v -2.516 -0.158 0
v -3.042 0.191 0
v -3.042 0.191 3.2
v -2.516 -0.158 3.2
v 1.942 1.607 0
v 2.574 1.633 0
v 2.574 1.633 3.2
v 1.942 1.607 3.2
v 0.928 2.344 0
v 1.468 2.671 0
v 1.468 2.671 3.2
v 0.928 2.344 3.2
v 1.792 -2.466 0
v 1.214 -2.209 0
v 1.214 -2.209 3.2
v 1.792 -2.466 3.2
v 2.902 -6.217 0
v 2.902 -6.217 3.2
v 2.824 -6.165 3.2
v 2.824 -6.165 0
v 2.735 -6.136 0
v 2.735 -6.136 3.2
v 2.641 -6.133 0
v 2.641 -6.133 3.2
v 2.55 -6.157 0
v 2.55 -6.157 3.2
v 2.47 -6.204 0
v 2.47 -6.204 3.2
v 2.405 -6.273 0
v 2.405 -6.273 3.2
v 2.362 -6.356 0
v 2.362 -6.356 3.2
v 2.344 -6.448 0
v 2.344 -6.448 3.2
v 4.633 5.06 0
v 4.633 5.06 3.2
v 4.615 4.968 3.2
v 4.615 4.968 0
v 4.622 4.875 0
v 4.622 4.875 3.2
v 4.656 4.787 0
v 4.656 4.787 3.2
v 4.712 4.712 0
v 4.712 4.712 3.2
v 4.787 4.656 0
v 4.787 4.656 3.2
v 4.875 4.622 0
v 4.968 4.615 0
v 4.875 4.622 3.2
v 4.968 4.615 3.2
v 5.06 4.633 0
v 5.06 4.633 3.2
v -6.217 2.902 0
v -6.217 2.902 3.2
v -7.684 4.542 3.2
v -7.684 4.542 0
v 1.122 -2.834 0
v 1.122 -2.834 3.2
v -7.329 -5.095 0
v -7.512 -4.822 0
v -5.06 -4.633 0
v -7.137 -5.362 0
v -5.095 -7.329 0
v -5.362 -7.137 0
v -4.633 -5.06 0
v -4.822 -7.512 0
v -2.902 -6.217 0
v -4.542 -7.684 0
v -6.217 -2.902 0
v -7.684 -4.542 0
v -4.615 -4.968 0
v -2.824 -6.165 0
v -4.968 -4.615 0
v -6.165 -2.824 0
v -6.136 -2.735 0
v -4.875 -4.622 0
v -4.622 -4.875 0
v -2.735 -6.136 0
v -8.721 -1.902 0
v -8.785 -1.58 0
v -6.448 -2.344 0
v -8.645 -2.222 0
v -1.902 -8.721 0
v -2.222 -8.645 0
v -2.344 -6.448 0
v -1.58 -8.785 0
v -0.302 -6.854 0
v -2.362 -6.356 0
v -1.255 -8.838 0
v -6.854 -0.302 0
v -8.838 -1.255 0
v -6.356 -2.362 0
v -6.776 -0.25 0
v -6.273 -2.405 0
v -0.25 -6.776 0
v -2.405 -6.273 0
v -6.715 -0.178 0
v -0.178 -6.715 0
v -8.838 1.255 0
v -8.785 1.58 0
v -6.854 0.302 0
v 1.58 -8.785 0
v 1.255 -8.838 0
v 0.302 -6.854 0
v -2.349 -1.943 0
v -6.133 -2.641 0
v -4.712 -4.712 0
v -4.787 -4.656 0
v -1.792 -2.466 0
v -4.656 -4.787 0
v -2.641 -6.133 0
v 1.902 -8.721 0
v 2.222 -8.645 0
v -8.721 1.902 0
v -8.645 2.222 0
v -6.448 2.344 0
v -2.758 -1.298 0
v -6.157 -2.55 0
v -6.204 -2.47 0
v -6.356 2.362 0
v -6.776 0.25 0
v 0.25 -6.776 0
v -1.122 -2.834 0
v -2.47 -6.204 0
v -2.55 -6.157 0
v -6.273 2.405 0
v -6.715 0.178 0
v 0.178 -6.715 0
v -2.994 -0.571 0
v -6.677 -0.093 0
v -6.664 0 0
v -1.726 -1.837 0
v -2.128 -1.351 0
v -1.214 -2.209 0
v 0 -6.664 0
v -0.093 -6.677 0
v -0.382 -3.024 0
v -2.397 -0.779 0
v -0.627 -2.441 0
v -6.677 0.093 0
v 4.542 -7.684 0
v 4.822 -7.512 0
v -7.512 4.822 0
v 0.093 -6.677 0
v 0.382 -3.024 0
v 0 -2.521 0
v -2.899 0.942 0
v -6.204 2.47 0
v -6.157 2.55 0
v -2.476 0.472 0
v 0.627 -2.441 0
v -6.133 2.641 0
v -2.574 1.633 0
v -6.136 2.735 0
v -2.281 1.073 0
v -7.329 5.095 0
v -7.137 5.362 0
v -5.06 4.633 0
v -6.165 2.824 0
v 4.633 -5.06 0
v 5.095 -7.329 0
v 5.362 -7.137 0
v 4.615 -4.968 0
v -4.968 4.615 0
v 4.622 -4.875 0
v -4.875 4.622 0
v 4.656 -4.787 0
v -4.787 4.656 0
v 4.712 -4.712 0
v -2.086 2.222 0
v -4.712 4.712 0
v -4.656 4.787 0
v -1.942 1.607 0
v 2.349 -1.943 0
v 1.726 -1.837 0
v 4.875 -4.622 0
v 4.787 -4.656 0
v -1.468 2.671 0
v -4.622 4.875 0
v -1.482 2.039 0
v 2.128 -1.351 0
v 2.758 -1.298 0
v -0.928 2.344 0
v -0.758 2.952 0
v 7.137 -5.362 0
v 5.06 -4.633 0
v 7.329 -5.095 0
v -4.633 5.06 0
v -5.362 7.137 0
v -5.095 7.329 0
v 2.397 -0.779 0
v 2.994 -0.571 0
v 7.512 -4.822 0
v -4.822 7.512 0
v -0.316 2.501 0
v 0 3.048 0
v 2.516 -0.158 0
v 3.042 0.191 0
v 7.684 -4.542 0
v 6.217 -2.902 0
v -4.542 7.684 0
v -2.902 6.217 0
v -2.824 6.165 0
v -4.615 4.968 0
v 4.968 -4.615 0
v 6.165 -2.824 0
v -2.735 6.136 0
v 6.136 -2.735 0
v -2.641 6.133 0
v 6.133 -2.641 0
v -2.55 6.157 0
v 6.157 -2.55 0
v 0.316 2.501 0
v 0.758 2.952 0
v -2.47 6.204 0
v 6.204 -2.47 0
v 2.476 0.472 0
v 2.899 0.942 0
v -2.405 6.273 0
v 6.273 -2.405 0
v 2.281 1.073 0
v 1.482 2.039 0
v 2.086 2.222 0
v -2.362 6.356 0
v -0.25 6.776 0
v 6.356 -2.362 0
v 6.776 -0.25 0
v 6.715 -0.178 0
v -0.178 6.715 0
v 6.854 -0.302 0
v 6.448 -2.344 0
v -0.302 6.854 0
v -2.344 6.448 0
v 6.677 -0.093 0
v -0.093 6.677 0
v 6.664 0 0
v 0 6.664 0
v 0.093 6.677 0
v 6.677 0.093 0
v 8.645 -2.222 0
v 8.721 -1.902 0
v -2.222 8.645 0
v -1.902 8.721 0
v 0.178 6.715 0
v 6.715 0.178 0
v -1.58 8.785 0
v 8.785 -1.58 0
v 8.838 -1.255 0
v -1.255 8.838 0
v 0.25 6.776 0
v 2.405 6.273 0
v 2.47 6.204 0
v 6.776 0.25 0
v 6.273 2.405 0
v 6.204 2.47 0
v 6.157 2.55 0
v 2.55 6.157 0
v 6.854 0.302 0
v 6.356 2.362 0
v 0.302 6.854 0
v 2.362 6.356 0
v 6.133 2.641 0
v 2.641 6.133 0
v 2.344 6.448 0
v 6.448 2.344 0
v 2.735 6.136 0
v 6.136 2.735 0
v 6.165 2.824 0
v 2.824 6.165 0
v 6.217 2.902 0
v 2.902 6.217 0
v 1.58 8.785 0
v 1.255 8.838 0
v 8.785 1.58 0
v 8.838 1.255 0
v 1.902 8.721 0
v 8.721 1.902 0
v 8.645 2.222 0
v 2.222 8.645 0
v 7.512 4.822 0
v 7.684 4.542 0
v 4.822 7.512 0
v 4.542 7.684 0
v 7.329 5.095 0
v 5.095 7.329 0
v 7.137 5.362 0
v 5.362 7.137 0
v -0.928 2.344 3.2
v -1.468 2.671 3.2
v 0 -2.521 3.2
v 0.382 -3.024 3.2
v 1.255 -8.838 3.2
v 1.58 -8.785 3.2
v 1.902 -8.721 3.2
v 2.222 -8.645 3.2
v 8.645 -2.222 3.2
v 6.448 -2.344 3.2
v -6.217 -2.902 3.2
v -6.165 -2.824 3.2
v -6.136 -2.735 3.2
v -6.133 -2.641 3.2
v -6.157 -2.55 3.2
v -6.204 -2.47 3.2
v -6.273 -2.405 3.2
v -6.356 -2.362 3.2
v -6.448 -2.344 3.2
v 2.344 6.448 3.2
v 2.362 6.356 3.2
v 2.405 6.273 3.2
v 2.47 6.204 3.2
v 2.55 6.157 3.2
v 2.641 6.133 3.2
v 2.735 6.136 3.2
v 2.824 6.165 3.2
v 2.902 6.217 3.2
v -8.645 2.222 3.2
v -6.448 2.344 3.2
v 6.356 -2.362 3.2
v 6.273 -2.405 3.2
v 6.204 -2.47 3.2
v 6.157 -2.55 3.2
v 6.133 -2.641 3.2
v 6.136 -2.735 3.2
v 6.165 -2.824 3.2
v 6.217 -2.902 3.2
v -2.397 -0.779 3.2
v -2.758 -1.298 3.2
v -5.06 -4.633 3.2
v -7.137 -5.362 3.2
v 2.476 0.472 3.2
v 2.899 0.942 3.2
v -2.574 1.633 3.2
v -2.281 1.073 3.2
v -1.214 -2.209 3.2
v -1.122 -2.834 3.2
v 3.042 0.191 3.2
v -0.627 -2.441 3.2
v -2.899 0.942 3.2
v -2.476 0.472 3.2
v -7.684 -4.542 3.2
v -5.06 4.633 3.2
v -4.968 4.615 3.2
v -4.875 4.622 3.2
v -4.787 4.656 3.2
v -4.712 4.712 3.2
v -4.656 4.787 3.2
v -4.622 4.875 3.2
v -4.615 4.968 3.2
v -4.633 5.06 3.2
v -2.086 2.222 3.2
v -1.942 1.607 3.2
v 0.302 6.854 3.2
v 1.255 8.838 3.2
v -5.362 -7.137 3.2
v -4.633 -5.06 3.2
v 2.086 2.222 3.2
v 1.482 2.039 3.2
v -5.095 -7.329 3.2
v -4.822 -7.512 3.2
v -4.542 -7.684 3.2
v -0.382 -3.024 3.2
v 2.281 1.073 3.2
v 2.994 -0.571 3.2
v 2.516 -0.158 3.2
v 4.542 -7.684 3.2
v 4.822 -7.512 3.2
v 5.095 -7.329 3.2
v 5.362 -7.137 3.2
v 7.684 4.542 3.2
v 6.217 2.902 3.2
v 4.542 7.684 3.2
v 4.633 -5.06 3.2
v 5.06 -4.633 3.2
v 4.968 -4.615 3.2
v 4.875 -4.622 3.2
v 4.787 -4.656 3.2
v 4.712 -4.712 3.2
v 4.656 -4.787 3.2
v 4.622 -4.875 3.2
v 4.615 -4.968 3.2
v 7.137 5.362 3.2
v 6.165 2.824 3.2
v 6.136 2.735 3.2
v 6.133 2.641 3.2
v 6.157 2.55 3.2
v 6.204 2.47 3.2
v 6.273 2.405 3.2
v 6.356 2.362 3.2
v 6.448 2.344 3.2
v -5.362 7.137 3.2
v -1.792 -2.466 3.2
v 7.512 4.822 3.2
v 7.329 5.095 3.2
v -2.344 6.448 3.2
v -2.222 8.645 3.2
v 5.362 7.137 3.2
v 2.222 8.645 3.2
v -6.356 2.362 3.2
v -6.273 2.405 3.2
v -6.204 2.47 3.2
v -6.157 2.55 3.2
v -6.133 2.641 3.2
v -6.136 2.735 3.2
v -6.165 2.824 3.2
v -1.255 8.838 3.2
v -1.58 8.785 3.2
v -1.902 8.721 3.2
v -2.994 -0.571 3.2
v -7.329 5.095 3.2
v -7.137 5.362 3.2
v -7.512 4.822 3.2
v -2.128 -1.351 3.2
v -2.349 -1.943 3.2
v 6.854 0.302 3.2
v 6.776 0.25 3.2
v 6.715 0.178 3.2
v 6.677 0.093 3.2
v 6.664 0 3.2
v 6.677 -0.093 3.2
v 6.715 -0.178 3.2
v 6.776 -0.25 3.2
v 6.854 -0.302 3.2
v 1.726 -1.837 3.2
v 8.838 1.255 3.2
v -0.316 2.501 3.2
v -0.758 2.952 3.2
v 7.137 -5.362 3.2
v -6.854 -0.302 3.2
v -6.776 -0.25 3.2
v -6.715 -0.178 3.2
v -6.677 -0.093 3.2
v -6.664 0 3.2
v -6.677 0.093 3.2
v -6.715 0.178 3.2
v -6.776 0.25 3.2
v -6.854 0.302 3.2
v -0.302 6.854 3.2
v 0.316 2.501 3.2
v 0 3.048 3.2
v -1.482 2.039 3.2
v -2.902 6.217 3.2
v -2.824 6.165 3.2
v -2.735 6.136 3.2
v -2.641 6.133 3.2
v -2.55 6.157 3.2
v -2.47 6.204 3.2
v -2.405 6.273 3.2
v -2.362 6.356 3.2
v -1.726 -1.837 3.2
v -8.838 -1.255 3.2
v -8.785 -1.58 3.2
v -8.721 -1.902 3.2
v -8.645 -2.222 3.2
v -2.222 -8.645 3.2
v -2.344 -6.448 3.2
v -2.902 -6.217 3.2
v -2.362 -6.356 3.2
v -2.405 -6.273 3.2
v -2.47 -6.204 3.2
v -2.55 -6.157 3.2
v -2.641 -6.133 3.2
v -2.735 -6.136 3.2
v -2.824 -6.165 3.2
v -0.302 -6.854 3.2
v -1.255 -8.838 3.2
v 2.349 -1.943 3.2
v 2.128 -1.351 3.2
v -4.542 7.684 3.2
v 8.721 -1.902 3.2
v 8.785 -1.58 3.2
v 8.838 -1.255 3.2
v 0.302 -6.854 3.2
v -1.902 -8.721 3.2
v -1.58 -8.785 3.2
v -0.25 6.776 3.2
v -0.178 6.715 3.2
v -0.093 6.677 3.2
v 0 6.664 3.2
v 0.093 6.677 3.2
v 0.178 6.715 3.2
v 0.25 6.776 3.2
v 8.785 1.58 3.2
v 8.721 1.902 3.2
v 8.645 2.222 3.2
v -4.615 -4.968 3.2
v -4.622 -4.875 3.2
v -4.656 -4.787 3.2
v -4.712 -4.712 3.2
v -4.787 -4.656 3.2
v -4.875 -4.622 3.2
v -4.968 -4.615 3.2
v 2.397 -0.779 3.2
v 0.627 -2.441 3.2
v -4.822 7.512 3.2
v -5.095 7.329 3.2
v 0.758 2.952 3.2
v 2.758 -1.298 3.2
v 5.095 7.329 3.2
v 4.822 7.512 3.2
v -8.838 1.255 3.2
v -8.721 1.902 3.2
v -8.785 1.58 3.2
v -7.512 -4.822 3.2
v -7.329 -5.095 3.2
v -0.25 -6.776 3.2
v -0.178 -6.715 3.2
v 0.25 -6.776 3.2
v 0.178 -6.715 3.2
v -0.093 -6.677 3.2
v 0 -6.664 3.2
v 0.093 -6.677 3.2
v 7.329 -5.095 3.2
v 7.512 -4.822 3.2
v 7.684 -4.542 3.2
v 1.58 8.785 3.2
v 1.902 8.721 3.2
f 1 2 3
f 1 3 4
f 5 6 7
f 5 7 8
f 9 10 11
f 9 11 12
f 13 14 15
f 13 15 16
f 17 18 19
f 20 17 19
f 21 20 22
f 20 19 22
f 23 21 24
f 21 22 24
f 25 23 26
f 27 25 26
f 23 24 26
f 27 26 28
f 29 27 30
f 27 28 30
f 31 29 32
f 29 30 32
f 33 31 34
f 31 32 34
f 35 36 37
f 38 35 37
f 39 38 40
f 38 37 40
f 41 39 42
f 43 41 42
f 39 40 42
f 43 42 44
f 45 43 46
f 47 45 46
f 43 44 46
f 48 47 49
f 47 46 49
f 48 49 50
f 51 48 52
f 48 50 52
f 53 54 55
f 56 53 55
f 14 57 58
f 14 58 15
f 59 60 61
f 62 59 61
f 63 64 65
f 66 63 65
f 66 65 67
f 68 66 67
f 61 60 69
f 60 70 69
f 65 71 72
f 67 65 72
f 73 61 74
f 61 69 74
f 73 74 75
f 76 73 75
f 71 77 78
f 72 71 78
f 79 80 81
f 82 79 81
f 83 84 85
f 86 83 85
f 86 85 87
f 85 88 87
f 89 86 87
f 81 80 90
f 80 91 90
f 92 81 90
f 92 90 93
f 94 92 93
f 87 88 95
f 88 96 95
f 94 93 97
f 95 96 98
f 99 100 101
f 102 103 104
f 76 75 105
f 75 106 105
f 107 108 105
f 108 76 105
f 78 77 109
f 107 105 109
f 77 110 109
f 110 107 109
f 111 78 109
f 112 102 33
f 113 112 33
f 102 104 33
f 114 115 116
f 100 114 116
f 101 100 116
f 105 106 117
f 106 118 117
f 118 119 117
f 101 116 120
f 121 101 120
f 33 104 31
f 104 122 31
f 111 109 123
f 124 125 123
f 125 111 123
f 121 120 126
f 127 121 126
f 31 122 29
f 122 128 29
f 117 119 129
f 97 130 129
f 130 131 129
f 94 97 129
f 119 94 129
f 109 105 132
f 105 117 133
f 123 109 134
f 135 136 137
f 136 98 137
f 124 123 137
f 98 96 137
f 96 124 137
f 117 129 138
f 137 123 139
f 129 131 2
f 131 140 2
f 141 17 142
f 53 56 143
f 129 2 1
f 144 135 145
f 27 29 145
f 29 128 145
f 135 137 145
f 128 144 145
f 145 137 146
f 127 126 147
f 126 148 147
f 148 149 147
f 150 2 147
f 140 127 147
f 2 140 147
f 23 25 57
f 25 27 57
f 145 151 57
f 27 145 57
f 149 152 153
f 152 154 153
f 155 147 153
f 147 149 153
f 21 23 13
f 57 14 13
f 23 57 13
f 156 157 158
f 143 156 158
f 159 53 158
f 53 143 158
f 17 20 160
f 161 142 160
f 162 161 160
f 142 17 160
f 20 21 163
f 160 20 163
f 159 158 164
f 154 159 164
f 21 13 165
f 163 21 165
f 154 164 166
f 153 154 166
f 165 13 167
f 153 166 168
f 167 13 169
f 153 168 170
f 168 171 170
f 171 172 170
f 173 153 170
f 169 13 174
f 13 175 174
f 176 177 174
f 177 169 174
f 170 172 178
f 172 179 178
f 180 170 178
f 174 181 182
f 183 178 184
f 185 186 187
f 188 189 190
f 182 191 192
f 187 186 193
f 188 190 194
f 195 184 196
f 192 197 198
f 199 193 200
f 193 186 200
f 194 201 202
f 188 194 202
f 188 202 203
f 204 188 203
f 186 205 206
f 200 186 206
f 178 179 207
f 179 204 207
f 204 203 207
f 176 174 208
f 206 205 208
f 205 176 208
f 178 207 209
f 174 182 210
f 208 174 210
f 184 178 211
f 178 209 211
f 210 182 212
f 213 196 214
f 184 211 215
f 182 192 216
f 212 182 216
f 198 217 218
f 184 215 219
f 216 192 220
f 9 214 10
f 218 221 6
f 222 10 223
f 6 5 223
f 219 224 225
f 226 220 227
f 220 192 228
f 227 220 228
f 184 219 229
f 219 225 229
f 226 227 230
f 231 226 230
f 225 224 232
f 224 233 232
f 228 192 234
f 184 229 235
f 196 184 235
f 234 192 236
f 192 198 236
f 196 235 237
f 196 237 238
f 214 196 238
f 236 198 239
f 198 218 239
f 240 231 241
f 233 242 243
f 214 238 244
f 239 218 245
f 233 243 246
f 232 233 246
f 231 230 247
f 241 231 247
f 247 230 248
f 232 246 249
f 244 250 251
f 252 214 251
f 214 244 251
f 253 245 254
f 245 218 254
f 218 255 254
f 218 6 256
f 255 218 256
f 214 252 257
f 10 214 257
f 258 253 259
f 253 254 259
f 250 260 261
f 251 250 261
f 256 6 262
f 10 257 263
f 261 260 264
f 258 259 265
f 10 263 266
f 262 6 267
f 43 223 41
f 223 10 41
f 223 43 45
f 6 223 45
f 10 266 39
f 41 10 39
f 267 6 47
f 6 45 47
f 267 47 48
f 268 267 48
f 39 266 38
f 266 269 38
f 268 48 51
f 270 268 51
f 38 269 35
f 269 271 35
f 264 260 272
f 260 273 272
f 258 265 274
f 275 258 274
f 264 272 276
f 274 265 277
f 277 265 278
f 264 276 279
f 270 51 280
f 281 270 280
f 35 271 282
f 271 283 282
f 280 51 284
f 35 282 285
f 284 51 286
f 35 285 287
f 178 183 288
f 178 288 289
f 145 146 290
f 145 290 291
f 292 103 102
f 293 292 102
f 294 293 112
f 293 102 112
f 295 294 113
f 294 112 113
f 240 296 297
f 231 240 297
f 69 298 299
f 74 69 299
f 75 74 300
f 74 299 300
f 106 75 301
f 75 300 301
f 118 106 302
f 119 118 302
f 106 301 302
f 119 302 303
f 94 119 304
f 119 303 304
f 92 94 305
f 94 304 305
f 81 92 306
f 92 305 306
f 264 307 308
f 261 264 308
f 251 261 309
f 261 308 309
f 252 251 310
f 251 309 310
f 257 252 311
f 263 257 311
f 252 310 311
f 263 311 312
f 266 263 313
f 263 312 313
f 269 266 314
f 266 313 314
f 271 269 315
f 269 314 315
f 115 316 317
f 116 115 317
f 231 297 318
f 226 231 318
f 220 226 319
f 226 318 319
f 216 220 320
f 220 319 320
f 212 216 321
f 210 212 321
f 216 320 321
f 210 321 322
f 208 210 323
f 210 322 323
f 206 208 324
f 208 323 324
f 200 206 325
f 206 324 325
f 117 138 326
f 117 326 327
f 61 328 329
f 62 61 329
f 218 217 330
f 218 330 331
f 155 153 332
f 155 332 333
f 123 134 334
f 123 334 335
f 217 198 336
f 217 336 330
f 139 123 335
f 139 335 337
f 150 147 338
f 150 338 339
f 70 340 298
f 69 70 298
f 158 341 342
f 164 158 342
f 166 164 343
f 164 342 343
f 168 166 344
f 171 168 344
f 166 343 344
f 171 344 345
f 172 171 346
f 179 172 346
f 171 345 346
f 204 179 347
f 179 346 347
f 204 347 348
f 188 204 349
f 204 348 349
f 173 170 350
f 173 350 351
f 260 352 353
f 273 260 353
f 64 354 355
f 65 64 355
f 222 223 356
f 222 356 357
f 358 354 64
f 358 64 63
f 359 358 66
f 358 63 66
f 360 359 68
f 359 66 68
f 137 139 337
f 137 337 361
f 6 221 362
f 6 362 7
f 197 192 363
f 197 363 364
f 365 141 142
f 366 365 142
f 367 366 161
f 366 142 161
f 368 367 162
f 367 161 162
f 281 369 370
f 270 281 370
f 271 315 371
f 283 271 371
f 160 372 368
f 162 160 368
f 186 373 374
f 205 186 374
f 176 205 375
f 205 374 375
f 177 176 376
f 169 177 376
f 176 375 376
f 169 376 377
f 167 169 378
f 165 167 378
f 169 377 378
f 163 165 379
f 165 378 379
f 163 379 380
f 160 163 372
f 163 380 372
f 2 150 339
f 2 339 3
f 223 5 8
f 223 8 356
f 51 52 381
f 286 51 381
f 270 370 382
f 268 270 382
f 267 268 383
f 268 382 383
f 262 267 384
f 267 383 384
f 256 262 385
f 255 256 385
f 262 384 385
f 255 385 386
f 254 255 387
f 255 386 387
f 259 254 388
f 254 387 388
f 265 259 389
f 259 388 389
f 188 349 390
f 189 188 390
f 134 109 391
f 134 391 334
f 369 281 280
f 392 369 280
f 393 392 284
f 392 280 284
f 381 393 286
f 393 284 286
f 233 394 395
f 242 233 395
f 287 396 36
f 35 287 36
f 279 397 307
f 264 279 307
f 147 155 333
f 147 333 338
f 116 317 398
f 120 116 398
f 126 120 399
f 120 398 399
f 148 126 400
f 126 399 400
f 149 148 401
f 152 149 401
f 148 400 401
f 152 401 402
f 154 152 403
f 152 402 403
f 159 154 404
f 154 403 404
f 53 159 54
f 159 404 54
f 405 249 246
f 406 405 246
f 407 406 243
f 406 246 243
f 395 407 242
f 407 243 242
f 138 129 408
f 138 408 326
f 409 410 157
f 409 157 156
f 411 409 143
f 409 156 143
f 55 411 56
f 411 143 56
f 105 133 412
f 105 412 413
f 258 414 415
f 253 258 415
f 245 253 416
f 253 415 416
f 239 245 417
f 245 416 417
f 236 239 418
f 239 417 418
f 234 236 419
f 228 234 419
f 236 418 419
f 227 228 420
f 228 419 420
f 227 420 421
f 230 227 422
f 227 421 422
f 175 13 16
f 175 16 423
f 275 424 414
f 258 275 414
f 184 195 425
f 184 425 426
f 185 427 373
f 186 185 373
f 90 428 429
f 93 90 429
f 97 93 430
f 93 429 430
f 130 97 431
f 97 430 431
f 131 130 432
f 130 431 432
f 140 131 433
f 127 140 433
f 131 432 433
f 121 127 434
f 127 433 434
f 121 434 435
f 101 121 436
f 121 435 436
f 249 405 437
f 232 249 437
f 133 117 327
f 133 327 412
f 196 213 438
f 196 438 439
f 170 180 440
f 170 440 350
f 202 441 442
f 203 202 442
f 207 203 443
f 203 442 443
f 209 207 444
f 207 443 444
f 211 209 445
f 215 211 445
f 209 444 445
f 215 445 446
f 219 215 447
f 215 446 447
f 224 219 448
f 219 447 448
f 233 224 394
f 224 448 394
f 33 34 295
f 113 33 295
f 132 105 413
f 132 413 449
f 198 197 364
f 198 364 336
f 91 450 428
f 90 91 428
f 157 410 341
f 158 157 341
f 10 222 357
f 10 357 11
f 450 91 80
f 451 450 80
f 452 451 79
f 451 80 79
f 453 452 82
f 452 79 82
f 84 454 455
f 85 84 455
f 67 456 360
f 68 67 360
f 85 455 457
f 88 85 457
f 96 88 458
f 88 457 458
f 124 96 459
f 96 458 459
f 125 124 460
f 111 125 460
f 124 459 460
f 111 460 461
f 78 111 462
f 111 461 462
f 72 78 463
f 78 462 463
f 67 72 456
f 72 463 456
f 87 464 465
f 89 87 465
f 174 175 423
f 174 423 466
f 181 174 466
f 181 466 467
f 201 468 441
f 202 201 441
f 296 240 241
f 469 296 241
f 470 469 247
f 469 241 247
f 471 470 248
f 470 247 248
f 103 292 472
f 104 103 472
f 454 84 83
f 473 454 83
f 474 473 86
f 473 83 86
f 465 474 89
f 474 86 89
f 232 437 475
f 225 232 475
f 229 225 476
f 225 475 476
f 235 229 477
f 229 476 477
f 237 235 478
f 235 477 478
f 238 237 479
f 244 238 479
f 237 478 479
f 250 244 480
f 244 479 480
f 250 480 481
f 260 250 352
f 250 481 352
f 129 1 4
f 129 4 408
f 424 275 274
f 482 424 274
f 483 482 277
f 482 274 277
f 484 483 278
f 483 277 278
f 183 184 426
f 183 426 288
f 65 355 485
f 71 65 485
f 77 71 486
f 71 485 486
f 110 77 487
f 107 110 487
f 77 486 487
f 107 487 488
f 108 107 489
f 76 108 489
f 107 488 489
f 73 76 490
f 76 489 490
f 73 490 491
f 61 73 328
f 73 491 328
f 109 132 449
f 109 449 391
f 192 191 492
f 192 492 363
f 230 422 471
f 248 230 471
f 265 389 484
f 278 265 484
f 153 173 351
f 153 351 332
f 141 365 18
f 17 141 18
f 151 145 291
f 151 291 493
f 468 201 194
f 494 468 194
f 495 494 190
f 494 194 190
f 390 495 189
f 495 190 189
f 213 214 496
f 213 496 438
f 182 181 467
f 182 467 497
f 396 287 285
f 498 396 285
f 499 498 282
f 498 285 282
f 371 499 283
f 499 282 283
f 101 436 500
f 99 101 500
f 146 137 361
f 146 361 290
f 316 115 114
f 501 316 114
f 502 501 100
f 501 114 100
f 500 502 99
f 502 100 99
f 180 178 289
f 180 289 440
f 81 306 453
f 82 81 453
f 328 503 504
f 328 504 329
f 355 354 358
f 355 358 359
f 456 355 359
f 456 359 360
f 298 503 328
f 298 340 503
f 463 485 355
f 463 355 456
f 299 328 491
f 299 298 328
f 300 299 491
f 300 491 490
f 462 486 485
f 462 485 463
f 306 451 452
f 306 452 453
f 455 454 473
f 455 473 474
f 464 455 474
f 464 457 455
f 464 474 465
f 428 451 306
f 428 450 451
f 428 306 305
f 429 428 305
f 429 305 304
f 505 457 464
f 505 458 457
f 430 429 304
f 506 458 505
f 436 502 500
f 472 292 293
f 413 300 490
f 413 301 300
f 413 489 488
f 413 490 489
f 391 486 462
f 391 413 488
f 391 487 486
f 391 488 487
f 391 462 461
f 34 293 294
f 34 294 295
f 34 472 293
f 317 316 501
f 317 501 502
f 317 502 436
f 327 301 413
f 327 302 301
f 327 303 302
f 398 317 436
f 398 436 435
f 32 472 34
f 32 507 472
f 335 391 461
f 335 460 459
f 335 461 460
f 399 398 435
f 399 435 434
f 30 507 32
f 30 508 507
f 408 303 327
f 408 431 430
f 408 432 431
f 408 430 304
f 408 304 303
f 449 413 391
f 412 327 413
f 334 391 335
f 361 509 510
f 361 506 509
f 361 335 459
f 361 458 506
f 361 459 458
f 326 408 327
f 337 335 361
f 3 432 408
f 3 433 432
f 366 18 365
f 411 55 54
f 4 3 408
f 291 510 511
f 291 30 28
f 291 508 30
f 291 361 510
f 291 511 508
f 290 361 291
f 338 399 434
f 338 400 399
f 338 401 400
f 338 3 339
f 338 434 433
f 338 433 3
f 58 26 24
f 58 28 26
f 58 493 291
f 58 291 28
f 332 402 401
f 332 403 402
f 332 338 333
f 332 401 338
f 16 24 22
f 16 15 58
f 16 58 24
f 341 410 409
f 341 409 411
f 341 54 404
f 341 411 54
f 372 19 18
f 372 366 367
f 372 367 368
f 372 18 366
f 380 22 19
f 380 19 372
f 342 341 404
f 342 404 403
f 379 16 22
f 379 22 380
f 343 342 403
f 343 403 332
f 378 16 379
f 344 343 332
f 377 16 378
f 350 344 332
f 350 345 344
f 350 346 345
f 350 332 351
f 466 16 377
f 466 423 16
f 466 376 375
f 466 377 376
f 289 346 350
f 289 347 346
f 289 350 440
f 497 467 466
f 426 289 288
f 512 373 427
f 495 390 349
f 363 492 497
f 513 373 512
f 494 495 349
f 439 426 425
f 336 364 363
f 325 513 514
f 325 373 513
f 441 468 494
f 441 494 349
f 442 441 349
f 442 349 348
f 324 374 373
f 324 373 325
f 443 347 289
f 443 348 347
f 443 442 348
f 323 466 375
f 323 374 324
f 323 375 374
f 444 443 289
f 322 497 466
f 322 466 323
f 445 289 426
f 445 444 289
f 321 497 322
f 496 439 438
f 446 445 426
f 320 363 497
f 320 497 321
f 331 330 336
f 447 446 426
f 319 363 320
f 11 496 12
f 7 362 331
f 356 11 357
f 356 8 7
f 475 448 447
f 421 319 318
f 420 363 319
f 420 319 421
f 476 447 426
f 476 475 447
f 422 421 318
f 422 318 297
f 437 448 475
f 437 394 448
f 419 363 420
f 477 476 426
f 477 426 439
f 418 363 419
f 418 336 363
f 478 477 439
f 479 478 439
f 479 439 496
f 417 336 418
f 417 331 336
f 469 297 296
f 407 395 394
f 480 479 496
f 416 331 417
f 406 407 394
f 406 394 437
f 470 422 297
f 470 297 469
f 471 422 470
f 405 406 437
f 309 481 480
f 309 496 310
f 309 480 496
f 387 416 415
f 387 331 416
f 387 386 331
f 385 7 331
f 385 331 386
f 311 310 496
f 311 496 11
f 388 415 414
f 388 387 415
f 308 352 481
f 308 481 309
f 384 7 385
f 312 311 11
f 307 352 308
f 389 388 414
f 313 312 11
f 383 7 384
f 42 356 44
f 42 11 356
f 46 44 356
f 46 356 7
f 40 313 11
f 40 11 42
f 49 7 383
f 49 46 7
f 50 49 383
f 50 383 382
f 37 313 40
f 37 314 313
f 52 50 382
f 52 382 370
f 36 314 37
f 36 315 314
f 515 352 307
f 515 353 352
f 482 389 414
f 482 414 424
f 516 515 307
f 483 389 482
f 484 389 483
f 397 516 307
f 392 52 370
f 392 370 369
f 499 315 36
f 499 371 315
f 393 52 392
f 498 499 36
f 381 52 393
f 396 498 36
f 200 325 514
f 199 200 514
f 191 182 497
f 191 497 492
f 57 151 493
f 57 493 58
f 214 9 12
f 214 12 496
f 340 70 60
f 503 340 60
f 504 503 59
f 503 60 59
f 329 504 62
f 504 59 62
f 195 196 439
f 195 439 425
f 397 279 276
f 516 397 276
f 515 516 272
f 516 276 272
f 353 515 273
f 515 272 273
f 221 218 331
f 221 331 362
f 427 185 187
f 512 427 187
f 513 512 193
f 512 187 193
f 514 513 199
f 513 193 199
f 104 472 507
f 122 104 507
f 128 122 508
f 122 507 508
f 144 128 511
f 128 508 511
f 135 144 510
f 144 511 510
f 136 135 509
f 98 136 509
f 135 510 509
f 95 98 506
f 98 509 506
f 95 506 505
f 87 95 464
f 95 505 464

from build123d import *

# Parameters (mm, degrees)
SKETCH1_R           = 8.926200703
BOSS_EXTRUDE1_DEPTH = 3.2004
CUT_EXTRUDE1_DEPTH  = 3.2004


with BuildPart() as part:
    # Sketch1 → Boss-Extrude1 (new body)
    with BuildSketch(Plane.XY):
        Circle(SKETCH1_R)
        Polygon((0, 3.048), (-0.315924789, 2.500802214), (-0.758006776, 2.952241475), (-0.927923651, 2.343667613), (-1.468385199, 2.670982761), (-1.481617658, 2.039271757), (-2.086499579, 2.221896376), (-1.942216178, 1.606740957), (-2.573511517, 1.633200071), (-2.280778112, 1.073252713), (-2.898820262, 0.941883799), (-2.47603037, 0.472328054), (-3.041985468, 0.191385504), (-2.515704533, -0.158274714), (-2.99401154, -0.571138247), (-2.397307729, -0.778932499), (-2.757912856, -1.297775281), (-2.128279263, -1.350647091), (-2.348524364, -1.942868321), (-1.725523184, -1.837495558), (-1.791569449, -2.465883799), (-1.214346137, -2.208887422), (-1.122043637, -2.833958729), (-0.626867256, -2.441486766), (-0.382015696, -3.02396561), (0, -2.520678517), (0.382015696, -3.02396561), (0.626867256, -2.441486766), (1.122043637, -2.833958729), (1.214346137, -2.208887422), (1.791569449, -2.465883799), (1.725523184, -1.837495558), (2.348524364, -1.942868321), (2.128279263, -1.350647091), (2.757912856, -1.297775281), (2.397307729, -0.778932499), (2.99401154, -0.571138247), (2.515704533, -0.158274714), (3.041985468, 0.191385504), (2.47603037, 0.472328054), (2.898820262, 0.941883799), (2.280778112, 1.073252713), (2.573511517, 1.633200071), (1.942216178, 1.606740957), (2.086499579, 2.221896376), (1.481617658, 2.039271757), (1.468385199, 2.670982761), (0.927923651, 2.343667613), (0.758006776, 2.952241475), (0.315924789, 2.500802214), align=None, mode=Mode.SUBTRACT)
    extrude(amount=BOSS_EXTRUDE1_DEPTH)

    # Sketch2 → Cut-Extrude1 (cut)
    with BuildSketch(Plane.XY.offset(3.2004)):
        with BuildLine():
            Line((-1.255122678, 8.837518093), (-0.301897322, 6.853917937))
            ThreePointArc((-0.301897322, 6.853917937), (0, 6.664048588), (0.301897322, 6.853917937))
            Line((0.301897322, 6.853917937), (1.255122678, 8.837518093))
            ThreePointArc((1.255122678, 8.837518093), (0, 8.926200703), (-1.255122678, 8.837518093))
        make_face()
        with BuildLine():
            Line((2.901797598, 6.216663396), (4.54155391, 7.68448743))
            ThreePointArc((4.54155391, 7.68448743), (3.415909123, 8.246734132), (2.222389605, 8.645116739))
            Line((2.222389605, 8.645116739), (2.343964085, 6.447725603))
            ThreePointArc((2.343964085, 6.447725603), (2.550220987, 6.156778094), (2.901797598, 6.216663396))
        make_face()
        with BuildLine():
            Line((5.059925495, 4.632978207), (7.136574729, 5.361563216))
            ThreePointArc((7.136574729, 5.361563216), (6.311777047, 6.311777047), (5.361563216, 7.136574729))
            Line((5.361563216, 7.136574729), (4.632978207, 5.059925495))
            ThreePointArc((4.632978207, 5.059925495), (4.712193947, 4.712193947), (5.059925495, 4.632978207))
        make_face()
        with BuildLine():
            Line((6.447725603, 2.343964085), (8.645116739, 2.222389605))
            ThreePointArc((8.645116739, 2.222389605), (8.246734132, 3.415909123), (7.68448743, 4.54155391))
            Line((7.68448743, 4.54155391), (6.216663396, 2.901797598))
            ThreePointArc((6.216663396, 2.901797598), (6.156778094, 2.550220987), (6.447725603, 2.343964085))
        make_face()
        with BuildLine():
            Line((6.853917937, -0.301897322), (8.837518093, -1.255122678))
            ThreePointArc((8.837518093, -1.255122678), (8.926200703, 0), (8.837518093, 1.255122678))
            Line((8.837518093, 1.255122678), (6.853917937, 0.301897322))
            ThreePointArc((6.853917937, 0.301897322), (6.664048588, 0), (6.853917937, -0.301897322))
        make_face()
        with BuildLine():
            Line((6.216663396, -2.901797598), (7.68448743, -4.54155391))
            ThreePointArc((7.68448743, -4.54155391), (8.246734132, -3.415909123), (8.645116739, -2.222389605))
            Line((8.645116739, -2.222389605), (6.447725603, -2.343964085))
            ThreePointArc((6.447725603, -2.343964085), (6.156778094, -2.550220987), (6.216663396, -2.901797598))
        make_face()
        with BuildLine():
            Line((4.632978207, -5.059925495), (5.361563216, -7.136574729))
            ThreePointArc((5.361563216, -7.136574729), (6.311777047, -6.311777047), (7.136574729, -5.361563216))
            Line((7.136574729, -5.361563216), (5.059925495, -4.632978207))
            ThreePointArc((5.059925495, -4.632978207), (4.712193947, -4.712193947), (4.632978207, -5.059925495))
        make_face()
        with BuildLine():
            Line((2.343964085, -6.447725603), (2.222389605, -8.645116739))
            ThreePointArc((2.222389605, -8.645116739), (3.415909123, -8.246734132), (4.54155391, -7.68448743))
            Line((4.54155391, -7.68448743), (2.901797598, -6.216663396))
            ThreePointArc((2.901797598, -6.216663396), (2.550220987, -6.156778094), (2.343964085, -6.447725603))
        make_face()
        with BuildLine():
            Line((-0.301897322, -6.853917937), (-1.255122678, -8.837518093))
            ThreePointArc((-1.255122678, -8.837518093), (0, -8.926200703), (1.255122678, -8.837518093))
            Line((1.255122678, -8.837518093), (0.301897322, -6.853917937))
            ThreePointArc((0.301897322, -6.853917937), (0, -6.664048588), (-0.301897322, -6.853917937))
        make_face()
        with BuildLine():
            Line((-2.901797598, -6.216663396), (-4.54155391, -7.68448743))
            ThreePointArc((-4.54155391, -7.68448743), (-3.415909123, -8.246734132), (-2.222389605, -8.645116739))
            Line((-2.222389605, -8.645116739), (-2.343964085, -6.447725603))
            ThreePointArc((-2.343964085, -6.447725603), (-2.550220987, -6.156778094), (-2.901797598, -6.216663396))
        make_face()
        with BuildLine():
            Line((-5.059925495, -4.632978207), (-7.136574729, -5.361563216))
            ThreePointArc((-7.136574729, -5.361563216), (-6.311777047, -6.311777047), (-5.361563216, -7.136574729))
            Line((-5.361563216, -7.136574729), (-4.632978207, -5.059925495))
            ThreePointArc((-4.632978207, -5.059925495), (-4.712193947, -4.712193947), (-5.059925495, -4.632978207))
        make_face()
        with BuildLine():
            Line((-6.447725603, -2.343964085), (-8.645116739, -2.222389605))
            ThreePointArc((-8.645116739, -2.222389605), (-8.246734132, -3.415909123), (-7.68448743, -4.54155391))
            Line((-7.68448743, -4.54155391), (-6.216663396, -2.901797598))
            ThreePointArc((-6.216663396, -2.901797598), (-6.156778094, -2.550220987), (-6.447725603, -2.343964085))
        make_face()
        with BuildLine():
            Line((-6.853917937, 0.301897322), (-8.837518093, 1.255122678))
            ThreePointArc((-8.837518093, 1.255122678), (-8.926200703, 0), (-8.837518093, -1.255122678))
            Line((-8.837518093, -1.255122678), (-6.853917937, -0.301897322))
            ThreePointArc((-6.853917937, -0.301897322), (-6.664048588, 0), (-6.853917937, 0.301897322))
        make_face()
        with BuildLine():
            Line((-6.216663396, 2.901797598), (-7.68448743, 4.54155391))
            ThreePointArc((-7.68448743, 4.54155391), (-8.246734132, 3.415909123), (-8.645116739, 2.222389605))
            Line((-8.645116739, 2.222389605), (-6.447725603, 2.343964085))
            ThreePointArc((-6.447725603, 2.343964085), (-6.156778094, 2.550220987), (-6.216663396, 2.901797598))
        make_face()
        with BuildLine():
            Line((-4.632978207, 5.059925495), (-5.361563216, 7.136574729))
            ThreePointArc((-5.361563216, 7.136574729), (-6.311777047, 6.311777047), (-7.136574729, 5.361563216))
            Line((-7.136574729, 5.361563216), (-5.059925495, 4.632978207))
            ThreePointArc((-5.059925495, 4.632978207), (-4.712193947, 4.712193947), (-4.632978207, 5.059925495))
        make_face()
        with BuildLine():
            Line((-2.343964085, 6.447725603), (-2.222389605, 8.645116739))
            ThreePointArc((-2.222389605, 8.645116739), (-3.415909123, 8.246734132), (-4.54155391, 7.68448743))
            Line((-4.54155391, 7.68448743), (-2.901797598, 6.216663396))
            ThreePointArc((-2.901797598, 6.216663396), (-2.550220987, 6.156778094), (-2.343964085, 6.447725603))
        make_face()
    extrude(amount=-CUT_EXTRUDE1_DEPTH, mode=Mode.SUBTRACT)


solid = part.part
